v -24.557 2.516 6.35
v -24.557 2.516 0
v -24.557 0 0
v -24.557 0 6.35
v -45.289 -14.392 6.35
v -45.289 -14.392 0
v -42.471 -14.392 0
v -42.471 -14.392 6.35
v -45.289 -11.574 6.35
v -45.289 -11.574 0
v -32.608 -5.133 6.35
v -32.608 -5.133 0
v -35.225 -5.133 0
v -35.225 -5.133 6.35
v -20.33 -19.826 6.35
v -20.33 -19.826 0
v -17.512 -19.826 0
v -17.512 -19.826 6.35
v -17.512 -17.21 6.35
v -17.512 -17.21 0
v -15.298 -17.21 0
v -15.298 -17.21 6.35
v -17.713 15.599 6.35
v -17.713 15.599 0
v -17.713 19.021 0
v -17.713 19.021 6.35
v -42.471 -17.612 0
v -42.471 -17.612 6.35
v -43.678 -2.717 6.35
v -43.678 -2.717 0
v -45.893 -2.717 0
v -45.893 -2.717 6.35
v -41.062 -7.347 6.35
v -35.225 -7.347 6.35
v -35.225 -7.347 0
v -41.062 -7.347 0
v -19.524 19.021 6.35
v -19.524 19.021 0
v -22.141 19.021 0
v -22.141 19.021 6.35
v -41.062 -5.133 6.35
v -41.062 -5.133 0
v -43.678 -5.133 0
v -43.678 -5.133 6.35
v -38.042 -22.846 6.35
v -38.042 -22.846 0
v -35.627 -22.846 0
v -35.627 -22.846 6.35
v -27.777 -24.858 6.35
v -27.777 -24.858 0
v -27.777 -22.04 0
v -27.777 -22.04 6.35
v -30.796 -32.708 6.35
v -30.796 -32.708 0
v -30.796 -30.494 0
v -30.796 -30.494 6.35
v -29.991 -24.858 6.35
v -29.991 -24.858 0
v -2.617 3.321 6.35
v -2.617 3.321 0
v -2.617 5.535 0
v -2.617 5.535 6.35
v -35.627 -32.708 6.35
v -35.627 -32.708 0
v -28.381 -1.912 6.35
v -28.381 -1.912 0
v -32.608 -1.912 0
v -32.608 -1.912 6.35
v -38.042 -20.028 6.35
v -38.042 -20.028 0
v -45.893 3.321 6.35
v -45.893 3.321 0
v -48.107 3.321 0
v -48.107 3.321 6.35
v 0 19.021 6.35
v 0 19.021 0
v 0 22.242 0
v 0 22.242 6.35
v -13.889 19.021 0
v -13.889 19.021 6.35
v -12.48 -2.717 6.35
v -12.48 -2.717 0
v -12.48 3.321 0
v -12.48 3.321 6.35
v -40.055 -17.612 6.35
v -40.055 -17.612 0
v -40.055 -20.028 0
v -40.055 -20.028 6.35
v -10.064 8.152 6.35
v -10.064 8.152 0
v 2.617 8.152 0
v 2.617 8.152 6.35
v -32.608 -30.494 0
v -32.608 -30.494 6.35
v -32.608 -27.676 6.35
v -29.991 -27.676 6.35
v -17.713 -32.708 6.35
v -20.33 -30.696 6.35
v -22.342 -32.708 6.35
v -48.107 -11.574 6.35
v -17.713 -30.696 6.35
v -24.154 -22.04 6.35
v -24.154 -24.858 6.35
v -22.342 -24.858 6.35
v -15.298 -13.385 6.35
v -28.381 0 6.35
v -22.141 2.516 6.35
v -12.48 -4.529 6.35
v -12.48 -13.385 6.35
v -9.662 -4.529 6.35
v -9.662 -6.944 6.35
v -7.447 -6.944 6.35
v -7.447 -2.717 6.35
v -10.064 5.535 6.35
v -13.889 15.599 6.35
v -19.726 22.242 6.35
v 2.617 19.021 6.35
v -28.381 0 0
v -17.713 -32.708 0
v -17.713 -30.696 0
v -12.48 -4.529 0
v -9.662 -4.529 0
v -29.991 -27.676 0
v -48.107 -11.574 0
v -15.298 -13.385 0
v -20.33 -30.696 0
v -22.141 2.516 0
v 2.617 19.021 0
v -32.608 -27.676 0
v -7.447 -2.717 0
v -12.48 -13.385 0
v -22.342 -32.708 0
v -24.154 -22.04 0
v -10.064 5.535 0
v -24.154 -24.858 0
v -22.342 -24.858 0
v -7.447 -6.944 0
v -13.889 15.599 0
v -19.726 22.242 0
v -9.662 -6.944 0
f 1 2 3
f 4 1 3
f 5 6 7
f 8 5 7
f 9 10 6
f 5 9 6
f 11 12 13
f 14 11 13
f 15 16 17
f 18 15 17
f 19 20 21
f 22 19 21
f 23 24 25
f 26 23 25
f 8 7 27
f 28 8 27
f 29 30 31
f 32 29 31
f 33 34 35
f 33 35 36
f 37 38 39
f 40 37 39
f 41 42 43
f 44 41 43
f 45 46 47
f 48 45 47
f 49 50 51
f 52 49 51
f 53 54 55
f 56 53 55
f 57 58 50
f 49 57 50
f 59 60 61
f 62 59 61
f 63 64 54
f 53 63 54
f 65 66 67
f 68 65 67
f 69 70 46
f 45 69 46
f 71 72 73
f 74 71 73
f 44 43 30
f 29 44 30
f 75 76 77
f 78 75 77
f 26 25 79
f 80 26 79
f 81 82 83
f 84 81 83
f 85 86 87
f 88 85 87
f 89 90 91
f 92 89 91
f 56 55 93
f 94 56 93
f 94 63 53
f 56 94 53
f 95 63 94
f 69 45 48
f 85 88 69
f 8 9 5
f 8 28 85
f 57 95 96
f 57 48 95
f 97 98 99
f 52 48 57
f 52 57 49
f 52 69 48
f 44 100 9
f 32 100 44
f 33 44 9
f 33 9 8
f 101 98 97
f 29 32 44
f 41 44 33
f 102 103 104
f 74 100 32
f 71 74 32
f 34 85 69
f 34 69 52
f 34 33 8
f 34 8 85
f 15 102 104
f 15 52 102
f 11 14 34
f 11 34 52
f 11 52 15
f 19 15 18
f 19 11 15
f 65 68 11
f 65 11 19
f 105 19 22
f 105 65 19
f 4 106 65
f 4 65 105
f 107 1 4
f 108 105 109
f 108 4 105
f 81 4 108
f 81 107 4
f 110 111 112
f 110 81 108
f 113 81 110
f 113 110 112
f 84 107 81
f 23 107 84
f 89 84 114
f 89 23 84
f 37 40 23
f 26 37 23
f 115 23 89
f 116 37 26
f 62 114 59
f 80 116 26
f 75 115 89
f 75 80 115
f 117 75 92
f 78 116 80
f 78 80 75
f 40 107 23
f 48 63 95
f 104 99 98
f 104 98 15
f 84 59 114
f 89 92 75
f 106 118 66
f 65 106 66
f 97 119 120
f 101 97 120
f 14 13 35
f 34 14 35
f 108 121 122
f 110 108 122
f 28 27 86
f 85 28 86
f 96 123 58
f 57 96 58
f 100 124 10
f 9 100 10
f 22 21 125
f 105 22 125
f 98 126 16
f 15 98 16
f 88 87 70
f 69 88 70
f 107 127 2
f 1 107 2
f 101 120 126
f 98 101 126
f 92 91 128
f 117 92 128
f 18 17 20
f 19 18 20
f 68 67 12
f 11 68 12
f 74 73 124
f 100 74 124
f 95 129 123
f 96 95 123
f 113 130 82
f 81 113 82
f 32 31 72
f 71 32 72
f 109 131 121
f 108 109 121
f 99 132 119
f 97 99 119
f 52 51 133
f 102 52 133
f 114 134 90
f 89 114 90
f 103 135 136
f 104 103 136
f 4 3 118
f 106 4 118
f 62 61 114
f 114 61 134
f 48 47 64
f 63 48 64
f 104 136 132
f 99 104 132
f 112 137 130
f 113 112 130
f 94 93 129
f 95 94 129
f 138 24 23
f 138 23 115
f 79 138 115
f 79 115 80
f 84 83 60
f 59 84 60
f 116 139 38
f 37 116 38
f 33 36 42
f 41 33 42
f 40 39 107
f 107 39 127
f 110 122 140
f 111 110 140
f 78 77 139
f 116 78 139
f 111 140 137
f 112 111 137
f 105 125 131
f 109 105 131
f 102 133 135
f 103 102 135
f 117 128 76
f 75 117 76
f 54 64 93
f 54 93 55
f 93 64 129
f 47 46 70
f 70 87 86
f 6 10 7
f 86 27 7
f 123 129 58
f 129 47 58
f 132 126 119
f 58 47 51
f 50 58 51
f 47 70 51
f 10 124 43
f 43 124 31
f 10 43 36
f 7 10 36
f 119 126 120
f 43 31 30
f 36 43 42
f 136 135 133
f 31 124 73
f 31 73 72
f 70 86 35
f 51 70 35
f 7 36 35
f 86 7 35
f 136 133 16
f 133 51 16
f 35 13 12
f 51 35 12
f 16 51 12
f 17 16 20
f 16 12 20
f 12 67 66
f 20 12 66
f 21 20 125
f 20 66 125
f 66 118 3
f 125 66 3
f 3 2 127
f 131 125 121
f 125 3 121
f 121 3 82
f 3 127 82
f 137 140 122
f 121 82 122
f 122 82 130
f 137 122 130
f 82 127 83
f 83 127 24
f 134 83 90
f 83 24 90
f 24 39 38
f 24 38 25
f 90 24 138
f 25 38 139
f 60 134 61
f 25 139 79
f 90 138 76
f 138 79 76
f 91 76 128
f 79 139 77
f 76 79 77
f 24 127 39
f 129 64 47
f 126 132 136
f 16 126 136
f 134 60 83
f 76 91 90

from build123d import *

# Parameters (mm, degrees)
F0_W     = 3.824378
F0_H     = 3.421813
F1_DEPTH = 6.35


with BuildPart() as f1:
    # F0 (on Top) → F1 (new body)
    with BuildSketch(Plane.XY):
        Polygon((0, 22.241773), (-19.725736, 22.241773), (-19.524453, 19.021247), (-22.141133, 19.021247), (-22.141133, 2.516038), (-24.556529, 2.516038), (-24.556529, 0), (-28.380906, 0), (-28.380906, -1.912189), (-32.60785, -1.912189), (-32.60785, -5.132717), (-35.224527, -5.132717), (-35.224527, -7.34683), (-41.061737, -7.34683), (-41.061737, -5.132717), (-43.678414, -5.132717), (-43.678414, -2.717321), (-45.892529, -2.717321), (-45.892529, 3.32117), (-48.106641, 3.32117), (-48.106641, -11.573775), (-45.288678, -11.573775), (-45.288678, -14.391736), (-42.470716, -14.391736), (-42.470716, -17.612264), (-40.05532, -17.612264), (-40.05532, -20.027662), (-38.042489, -20.027662), (-38.042489, -22.845622), (-35.627093, -22.845622), (-35.627093, -32.708492), (-30.796302, -32.708492), (-30.796302, -30.494377), (-32.60785, -30.494377), (-32.60785, -27.676415), (-29.99117, -27.676415), (-29.99117, -24.858454), (-27.777057, -24.858454), (-27.777057, -22.04049), (-24.153963, -22.04049), (-24.153963, -24.858454), (-22.342416, -24.858454), (-22.342416, -32.708492), (-17.712906, -32.708492), (-17.712906, -30.69566), (-20.329585, -30.69566), (-20.329585, -19.826377), (-17.511621, -19.826377), (-17.511621, -17.209699), (-15.29751, -17.209699), (-15.29751, -13.38532), (-12.479547, -13.38532), (-12.479547, -4.528868), (-9.661585, -4.528868), (-9.661585, -6.944264), (-7.447471, -6.944264), (-7.447471, -2.717321), (-12.479547, -2.717321), (-12.479547, 3.32117), (-2.616679, 3.32117), (-2.616679, 5.535283), (-10.064151, 5.535283), (-10.064151, 8.151962), (2.616679, 8.151962), (2.616679, 19.021247), (0, 19.021247), align=None)
        with Locations((-15.800717, 17.31034)):
            Rectangle(F0_W, F0_H, mode=Mode.SUBTRACT)
    extrude(amount=F1_DEPTH)


solid = f1.part
